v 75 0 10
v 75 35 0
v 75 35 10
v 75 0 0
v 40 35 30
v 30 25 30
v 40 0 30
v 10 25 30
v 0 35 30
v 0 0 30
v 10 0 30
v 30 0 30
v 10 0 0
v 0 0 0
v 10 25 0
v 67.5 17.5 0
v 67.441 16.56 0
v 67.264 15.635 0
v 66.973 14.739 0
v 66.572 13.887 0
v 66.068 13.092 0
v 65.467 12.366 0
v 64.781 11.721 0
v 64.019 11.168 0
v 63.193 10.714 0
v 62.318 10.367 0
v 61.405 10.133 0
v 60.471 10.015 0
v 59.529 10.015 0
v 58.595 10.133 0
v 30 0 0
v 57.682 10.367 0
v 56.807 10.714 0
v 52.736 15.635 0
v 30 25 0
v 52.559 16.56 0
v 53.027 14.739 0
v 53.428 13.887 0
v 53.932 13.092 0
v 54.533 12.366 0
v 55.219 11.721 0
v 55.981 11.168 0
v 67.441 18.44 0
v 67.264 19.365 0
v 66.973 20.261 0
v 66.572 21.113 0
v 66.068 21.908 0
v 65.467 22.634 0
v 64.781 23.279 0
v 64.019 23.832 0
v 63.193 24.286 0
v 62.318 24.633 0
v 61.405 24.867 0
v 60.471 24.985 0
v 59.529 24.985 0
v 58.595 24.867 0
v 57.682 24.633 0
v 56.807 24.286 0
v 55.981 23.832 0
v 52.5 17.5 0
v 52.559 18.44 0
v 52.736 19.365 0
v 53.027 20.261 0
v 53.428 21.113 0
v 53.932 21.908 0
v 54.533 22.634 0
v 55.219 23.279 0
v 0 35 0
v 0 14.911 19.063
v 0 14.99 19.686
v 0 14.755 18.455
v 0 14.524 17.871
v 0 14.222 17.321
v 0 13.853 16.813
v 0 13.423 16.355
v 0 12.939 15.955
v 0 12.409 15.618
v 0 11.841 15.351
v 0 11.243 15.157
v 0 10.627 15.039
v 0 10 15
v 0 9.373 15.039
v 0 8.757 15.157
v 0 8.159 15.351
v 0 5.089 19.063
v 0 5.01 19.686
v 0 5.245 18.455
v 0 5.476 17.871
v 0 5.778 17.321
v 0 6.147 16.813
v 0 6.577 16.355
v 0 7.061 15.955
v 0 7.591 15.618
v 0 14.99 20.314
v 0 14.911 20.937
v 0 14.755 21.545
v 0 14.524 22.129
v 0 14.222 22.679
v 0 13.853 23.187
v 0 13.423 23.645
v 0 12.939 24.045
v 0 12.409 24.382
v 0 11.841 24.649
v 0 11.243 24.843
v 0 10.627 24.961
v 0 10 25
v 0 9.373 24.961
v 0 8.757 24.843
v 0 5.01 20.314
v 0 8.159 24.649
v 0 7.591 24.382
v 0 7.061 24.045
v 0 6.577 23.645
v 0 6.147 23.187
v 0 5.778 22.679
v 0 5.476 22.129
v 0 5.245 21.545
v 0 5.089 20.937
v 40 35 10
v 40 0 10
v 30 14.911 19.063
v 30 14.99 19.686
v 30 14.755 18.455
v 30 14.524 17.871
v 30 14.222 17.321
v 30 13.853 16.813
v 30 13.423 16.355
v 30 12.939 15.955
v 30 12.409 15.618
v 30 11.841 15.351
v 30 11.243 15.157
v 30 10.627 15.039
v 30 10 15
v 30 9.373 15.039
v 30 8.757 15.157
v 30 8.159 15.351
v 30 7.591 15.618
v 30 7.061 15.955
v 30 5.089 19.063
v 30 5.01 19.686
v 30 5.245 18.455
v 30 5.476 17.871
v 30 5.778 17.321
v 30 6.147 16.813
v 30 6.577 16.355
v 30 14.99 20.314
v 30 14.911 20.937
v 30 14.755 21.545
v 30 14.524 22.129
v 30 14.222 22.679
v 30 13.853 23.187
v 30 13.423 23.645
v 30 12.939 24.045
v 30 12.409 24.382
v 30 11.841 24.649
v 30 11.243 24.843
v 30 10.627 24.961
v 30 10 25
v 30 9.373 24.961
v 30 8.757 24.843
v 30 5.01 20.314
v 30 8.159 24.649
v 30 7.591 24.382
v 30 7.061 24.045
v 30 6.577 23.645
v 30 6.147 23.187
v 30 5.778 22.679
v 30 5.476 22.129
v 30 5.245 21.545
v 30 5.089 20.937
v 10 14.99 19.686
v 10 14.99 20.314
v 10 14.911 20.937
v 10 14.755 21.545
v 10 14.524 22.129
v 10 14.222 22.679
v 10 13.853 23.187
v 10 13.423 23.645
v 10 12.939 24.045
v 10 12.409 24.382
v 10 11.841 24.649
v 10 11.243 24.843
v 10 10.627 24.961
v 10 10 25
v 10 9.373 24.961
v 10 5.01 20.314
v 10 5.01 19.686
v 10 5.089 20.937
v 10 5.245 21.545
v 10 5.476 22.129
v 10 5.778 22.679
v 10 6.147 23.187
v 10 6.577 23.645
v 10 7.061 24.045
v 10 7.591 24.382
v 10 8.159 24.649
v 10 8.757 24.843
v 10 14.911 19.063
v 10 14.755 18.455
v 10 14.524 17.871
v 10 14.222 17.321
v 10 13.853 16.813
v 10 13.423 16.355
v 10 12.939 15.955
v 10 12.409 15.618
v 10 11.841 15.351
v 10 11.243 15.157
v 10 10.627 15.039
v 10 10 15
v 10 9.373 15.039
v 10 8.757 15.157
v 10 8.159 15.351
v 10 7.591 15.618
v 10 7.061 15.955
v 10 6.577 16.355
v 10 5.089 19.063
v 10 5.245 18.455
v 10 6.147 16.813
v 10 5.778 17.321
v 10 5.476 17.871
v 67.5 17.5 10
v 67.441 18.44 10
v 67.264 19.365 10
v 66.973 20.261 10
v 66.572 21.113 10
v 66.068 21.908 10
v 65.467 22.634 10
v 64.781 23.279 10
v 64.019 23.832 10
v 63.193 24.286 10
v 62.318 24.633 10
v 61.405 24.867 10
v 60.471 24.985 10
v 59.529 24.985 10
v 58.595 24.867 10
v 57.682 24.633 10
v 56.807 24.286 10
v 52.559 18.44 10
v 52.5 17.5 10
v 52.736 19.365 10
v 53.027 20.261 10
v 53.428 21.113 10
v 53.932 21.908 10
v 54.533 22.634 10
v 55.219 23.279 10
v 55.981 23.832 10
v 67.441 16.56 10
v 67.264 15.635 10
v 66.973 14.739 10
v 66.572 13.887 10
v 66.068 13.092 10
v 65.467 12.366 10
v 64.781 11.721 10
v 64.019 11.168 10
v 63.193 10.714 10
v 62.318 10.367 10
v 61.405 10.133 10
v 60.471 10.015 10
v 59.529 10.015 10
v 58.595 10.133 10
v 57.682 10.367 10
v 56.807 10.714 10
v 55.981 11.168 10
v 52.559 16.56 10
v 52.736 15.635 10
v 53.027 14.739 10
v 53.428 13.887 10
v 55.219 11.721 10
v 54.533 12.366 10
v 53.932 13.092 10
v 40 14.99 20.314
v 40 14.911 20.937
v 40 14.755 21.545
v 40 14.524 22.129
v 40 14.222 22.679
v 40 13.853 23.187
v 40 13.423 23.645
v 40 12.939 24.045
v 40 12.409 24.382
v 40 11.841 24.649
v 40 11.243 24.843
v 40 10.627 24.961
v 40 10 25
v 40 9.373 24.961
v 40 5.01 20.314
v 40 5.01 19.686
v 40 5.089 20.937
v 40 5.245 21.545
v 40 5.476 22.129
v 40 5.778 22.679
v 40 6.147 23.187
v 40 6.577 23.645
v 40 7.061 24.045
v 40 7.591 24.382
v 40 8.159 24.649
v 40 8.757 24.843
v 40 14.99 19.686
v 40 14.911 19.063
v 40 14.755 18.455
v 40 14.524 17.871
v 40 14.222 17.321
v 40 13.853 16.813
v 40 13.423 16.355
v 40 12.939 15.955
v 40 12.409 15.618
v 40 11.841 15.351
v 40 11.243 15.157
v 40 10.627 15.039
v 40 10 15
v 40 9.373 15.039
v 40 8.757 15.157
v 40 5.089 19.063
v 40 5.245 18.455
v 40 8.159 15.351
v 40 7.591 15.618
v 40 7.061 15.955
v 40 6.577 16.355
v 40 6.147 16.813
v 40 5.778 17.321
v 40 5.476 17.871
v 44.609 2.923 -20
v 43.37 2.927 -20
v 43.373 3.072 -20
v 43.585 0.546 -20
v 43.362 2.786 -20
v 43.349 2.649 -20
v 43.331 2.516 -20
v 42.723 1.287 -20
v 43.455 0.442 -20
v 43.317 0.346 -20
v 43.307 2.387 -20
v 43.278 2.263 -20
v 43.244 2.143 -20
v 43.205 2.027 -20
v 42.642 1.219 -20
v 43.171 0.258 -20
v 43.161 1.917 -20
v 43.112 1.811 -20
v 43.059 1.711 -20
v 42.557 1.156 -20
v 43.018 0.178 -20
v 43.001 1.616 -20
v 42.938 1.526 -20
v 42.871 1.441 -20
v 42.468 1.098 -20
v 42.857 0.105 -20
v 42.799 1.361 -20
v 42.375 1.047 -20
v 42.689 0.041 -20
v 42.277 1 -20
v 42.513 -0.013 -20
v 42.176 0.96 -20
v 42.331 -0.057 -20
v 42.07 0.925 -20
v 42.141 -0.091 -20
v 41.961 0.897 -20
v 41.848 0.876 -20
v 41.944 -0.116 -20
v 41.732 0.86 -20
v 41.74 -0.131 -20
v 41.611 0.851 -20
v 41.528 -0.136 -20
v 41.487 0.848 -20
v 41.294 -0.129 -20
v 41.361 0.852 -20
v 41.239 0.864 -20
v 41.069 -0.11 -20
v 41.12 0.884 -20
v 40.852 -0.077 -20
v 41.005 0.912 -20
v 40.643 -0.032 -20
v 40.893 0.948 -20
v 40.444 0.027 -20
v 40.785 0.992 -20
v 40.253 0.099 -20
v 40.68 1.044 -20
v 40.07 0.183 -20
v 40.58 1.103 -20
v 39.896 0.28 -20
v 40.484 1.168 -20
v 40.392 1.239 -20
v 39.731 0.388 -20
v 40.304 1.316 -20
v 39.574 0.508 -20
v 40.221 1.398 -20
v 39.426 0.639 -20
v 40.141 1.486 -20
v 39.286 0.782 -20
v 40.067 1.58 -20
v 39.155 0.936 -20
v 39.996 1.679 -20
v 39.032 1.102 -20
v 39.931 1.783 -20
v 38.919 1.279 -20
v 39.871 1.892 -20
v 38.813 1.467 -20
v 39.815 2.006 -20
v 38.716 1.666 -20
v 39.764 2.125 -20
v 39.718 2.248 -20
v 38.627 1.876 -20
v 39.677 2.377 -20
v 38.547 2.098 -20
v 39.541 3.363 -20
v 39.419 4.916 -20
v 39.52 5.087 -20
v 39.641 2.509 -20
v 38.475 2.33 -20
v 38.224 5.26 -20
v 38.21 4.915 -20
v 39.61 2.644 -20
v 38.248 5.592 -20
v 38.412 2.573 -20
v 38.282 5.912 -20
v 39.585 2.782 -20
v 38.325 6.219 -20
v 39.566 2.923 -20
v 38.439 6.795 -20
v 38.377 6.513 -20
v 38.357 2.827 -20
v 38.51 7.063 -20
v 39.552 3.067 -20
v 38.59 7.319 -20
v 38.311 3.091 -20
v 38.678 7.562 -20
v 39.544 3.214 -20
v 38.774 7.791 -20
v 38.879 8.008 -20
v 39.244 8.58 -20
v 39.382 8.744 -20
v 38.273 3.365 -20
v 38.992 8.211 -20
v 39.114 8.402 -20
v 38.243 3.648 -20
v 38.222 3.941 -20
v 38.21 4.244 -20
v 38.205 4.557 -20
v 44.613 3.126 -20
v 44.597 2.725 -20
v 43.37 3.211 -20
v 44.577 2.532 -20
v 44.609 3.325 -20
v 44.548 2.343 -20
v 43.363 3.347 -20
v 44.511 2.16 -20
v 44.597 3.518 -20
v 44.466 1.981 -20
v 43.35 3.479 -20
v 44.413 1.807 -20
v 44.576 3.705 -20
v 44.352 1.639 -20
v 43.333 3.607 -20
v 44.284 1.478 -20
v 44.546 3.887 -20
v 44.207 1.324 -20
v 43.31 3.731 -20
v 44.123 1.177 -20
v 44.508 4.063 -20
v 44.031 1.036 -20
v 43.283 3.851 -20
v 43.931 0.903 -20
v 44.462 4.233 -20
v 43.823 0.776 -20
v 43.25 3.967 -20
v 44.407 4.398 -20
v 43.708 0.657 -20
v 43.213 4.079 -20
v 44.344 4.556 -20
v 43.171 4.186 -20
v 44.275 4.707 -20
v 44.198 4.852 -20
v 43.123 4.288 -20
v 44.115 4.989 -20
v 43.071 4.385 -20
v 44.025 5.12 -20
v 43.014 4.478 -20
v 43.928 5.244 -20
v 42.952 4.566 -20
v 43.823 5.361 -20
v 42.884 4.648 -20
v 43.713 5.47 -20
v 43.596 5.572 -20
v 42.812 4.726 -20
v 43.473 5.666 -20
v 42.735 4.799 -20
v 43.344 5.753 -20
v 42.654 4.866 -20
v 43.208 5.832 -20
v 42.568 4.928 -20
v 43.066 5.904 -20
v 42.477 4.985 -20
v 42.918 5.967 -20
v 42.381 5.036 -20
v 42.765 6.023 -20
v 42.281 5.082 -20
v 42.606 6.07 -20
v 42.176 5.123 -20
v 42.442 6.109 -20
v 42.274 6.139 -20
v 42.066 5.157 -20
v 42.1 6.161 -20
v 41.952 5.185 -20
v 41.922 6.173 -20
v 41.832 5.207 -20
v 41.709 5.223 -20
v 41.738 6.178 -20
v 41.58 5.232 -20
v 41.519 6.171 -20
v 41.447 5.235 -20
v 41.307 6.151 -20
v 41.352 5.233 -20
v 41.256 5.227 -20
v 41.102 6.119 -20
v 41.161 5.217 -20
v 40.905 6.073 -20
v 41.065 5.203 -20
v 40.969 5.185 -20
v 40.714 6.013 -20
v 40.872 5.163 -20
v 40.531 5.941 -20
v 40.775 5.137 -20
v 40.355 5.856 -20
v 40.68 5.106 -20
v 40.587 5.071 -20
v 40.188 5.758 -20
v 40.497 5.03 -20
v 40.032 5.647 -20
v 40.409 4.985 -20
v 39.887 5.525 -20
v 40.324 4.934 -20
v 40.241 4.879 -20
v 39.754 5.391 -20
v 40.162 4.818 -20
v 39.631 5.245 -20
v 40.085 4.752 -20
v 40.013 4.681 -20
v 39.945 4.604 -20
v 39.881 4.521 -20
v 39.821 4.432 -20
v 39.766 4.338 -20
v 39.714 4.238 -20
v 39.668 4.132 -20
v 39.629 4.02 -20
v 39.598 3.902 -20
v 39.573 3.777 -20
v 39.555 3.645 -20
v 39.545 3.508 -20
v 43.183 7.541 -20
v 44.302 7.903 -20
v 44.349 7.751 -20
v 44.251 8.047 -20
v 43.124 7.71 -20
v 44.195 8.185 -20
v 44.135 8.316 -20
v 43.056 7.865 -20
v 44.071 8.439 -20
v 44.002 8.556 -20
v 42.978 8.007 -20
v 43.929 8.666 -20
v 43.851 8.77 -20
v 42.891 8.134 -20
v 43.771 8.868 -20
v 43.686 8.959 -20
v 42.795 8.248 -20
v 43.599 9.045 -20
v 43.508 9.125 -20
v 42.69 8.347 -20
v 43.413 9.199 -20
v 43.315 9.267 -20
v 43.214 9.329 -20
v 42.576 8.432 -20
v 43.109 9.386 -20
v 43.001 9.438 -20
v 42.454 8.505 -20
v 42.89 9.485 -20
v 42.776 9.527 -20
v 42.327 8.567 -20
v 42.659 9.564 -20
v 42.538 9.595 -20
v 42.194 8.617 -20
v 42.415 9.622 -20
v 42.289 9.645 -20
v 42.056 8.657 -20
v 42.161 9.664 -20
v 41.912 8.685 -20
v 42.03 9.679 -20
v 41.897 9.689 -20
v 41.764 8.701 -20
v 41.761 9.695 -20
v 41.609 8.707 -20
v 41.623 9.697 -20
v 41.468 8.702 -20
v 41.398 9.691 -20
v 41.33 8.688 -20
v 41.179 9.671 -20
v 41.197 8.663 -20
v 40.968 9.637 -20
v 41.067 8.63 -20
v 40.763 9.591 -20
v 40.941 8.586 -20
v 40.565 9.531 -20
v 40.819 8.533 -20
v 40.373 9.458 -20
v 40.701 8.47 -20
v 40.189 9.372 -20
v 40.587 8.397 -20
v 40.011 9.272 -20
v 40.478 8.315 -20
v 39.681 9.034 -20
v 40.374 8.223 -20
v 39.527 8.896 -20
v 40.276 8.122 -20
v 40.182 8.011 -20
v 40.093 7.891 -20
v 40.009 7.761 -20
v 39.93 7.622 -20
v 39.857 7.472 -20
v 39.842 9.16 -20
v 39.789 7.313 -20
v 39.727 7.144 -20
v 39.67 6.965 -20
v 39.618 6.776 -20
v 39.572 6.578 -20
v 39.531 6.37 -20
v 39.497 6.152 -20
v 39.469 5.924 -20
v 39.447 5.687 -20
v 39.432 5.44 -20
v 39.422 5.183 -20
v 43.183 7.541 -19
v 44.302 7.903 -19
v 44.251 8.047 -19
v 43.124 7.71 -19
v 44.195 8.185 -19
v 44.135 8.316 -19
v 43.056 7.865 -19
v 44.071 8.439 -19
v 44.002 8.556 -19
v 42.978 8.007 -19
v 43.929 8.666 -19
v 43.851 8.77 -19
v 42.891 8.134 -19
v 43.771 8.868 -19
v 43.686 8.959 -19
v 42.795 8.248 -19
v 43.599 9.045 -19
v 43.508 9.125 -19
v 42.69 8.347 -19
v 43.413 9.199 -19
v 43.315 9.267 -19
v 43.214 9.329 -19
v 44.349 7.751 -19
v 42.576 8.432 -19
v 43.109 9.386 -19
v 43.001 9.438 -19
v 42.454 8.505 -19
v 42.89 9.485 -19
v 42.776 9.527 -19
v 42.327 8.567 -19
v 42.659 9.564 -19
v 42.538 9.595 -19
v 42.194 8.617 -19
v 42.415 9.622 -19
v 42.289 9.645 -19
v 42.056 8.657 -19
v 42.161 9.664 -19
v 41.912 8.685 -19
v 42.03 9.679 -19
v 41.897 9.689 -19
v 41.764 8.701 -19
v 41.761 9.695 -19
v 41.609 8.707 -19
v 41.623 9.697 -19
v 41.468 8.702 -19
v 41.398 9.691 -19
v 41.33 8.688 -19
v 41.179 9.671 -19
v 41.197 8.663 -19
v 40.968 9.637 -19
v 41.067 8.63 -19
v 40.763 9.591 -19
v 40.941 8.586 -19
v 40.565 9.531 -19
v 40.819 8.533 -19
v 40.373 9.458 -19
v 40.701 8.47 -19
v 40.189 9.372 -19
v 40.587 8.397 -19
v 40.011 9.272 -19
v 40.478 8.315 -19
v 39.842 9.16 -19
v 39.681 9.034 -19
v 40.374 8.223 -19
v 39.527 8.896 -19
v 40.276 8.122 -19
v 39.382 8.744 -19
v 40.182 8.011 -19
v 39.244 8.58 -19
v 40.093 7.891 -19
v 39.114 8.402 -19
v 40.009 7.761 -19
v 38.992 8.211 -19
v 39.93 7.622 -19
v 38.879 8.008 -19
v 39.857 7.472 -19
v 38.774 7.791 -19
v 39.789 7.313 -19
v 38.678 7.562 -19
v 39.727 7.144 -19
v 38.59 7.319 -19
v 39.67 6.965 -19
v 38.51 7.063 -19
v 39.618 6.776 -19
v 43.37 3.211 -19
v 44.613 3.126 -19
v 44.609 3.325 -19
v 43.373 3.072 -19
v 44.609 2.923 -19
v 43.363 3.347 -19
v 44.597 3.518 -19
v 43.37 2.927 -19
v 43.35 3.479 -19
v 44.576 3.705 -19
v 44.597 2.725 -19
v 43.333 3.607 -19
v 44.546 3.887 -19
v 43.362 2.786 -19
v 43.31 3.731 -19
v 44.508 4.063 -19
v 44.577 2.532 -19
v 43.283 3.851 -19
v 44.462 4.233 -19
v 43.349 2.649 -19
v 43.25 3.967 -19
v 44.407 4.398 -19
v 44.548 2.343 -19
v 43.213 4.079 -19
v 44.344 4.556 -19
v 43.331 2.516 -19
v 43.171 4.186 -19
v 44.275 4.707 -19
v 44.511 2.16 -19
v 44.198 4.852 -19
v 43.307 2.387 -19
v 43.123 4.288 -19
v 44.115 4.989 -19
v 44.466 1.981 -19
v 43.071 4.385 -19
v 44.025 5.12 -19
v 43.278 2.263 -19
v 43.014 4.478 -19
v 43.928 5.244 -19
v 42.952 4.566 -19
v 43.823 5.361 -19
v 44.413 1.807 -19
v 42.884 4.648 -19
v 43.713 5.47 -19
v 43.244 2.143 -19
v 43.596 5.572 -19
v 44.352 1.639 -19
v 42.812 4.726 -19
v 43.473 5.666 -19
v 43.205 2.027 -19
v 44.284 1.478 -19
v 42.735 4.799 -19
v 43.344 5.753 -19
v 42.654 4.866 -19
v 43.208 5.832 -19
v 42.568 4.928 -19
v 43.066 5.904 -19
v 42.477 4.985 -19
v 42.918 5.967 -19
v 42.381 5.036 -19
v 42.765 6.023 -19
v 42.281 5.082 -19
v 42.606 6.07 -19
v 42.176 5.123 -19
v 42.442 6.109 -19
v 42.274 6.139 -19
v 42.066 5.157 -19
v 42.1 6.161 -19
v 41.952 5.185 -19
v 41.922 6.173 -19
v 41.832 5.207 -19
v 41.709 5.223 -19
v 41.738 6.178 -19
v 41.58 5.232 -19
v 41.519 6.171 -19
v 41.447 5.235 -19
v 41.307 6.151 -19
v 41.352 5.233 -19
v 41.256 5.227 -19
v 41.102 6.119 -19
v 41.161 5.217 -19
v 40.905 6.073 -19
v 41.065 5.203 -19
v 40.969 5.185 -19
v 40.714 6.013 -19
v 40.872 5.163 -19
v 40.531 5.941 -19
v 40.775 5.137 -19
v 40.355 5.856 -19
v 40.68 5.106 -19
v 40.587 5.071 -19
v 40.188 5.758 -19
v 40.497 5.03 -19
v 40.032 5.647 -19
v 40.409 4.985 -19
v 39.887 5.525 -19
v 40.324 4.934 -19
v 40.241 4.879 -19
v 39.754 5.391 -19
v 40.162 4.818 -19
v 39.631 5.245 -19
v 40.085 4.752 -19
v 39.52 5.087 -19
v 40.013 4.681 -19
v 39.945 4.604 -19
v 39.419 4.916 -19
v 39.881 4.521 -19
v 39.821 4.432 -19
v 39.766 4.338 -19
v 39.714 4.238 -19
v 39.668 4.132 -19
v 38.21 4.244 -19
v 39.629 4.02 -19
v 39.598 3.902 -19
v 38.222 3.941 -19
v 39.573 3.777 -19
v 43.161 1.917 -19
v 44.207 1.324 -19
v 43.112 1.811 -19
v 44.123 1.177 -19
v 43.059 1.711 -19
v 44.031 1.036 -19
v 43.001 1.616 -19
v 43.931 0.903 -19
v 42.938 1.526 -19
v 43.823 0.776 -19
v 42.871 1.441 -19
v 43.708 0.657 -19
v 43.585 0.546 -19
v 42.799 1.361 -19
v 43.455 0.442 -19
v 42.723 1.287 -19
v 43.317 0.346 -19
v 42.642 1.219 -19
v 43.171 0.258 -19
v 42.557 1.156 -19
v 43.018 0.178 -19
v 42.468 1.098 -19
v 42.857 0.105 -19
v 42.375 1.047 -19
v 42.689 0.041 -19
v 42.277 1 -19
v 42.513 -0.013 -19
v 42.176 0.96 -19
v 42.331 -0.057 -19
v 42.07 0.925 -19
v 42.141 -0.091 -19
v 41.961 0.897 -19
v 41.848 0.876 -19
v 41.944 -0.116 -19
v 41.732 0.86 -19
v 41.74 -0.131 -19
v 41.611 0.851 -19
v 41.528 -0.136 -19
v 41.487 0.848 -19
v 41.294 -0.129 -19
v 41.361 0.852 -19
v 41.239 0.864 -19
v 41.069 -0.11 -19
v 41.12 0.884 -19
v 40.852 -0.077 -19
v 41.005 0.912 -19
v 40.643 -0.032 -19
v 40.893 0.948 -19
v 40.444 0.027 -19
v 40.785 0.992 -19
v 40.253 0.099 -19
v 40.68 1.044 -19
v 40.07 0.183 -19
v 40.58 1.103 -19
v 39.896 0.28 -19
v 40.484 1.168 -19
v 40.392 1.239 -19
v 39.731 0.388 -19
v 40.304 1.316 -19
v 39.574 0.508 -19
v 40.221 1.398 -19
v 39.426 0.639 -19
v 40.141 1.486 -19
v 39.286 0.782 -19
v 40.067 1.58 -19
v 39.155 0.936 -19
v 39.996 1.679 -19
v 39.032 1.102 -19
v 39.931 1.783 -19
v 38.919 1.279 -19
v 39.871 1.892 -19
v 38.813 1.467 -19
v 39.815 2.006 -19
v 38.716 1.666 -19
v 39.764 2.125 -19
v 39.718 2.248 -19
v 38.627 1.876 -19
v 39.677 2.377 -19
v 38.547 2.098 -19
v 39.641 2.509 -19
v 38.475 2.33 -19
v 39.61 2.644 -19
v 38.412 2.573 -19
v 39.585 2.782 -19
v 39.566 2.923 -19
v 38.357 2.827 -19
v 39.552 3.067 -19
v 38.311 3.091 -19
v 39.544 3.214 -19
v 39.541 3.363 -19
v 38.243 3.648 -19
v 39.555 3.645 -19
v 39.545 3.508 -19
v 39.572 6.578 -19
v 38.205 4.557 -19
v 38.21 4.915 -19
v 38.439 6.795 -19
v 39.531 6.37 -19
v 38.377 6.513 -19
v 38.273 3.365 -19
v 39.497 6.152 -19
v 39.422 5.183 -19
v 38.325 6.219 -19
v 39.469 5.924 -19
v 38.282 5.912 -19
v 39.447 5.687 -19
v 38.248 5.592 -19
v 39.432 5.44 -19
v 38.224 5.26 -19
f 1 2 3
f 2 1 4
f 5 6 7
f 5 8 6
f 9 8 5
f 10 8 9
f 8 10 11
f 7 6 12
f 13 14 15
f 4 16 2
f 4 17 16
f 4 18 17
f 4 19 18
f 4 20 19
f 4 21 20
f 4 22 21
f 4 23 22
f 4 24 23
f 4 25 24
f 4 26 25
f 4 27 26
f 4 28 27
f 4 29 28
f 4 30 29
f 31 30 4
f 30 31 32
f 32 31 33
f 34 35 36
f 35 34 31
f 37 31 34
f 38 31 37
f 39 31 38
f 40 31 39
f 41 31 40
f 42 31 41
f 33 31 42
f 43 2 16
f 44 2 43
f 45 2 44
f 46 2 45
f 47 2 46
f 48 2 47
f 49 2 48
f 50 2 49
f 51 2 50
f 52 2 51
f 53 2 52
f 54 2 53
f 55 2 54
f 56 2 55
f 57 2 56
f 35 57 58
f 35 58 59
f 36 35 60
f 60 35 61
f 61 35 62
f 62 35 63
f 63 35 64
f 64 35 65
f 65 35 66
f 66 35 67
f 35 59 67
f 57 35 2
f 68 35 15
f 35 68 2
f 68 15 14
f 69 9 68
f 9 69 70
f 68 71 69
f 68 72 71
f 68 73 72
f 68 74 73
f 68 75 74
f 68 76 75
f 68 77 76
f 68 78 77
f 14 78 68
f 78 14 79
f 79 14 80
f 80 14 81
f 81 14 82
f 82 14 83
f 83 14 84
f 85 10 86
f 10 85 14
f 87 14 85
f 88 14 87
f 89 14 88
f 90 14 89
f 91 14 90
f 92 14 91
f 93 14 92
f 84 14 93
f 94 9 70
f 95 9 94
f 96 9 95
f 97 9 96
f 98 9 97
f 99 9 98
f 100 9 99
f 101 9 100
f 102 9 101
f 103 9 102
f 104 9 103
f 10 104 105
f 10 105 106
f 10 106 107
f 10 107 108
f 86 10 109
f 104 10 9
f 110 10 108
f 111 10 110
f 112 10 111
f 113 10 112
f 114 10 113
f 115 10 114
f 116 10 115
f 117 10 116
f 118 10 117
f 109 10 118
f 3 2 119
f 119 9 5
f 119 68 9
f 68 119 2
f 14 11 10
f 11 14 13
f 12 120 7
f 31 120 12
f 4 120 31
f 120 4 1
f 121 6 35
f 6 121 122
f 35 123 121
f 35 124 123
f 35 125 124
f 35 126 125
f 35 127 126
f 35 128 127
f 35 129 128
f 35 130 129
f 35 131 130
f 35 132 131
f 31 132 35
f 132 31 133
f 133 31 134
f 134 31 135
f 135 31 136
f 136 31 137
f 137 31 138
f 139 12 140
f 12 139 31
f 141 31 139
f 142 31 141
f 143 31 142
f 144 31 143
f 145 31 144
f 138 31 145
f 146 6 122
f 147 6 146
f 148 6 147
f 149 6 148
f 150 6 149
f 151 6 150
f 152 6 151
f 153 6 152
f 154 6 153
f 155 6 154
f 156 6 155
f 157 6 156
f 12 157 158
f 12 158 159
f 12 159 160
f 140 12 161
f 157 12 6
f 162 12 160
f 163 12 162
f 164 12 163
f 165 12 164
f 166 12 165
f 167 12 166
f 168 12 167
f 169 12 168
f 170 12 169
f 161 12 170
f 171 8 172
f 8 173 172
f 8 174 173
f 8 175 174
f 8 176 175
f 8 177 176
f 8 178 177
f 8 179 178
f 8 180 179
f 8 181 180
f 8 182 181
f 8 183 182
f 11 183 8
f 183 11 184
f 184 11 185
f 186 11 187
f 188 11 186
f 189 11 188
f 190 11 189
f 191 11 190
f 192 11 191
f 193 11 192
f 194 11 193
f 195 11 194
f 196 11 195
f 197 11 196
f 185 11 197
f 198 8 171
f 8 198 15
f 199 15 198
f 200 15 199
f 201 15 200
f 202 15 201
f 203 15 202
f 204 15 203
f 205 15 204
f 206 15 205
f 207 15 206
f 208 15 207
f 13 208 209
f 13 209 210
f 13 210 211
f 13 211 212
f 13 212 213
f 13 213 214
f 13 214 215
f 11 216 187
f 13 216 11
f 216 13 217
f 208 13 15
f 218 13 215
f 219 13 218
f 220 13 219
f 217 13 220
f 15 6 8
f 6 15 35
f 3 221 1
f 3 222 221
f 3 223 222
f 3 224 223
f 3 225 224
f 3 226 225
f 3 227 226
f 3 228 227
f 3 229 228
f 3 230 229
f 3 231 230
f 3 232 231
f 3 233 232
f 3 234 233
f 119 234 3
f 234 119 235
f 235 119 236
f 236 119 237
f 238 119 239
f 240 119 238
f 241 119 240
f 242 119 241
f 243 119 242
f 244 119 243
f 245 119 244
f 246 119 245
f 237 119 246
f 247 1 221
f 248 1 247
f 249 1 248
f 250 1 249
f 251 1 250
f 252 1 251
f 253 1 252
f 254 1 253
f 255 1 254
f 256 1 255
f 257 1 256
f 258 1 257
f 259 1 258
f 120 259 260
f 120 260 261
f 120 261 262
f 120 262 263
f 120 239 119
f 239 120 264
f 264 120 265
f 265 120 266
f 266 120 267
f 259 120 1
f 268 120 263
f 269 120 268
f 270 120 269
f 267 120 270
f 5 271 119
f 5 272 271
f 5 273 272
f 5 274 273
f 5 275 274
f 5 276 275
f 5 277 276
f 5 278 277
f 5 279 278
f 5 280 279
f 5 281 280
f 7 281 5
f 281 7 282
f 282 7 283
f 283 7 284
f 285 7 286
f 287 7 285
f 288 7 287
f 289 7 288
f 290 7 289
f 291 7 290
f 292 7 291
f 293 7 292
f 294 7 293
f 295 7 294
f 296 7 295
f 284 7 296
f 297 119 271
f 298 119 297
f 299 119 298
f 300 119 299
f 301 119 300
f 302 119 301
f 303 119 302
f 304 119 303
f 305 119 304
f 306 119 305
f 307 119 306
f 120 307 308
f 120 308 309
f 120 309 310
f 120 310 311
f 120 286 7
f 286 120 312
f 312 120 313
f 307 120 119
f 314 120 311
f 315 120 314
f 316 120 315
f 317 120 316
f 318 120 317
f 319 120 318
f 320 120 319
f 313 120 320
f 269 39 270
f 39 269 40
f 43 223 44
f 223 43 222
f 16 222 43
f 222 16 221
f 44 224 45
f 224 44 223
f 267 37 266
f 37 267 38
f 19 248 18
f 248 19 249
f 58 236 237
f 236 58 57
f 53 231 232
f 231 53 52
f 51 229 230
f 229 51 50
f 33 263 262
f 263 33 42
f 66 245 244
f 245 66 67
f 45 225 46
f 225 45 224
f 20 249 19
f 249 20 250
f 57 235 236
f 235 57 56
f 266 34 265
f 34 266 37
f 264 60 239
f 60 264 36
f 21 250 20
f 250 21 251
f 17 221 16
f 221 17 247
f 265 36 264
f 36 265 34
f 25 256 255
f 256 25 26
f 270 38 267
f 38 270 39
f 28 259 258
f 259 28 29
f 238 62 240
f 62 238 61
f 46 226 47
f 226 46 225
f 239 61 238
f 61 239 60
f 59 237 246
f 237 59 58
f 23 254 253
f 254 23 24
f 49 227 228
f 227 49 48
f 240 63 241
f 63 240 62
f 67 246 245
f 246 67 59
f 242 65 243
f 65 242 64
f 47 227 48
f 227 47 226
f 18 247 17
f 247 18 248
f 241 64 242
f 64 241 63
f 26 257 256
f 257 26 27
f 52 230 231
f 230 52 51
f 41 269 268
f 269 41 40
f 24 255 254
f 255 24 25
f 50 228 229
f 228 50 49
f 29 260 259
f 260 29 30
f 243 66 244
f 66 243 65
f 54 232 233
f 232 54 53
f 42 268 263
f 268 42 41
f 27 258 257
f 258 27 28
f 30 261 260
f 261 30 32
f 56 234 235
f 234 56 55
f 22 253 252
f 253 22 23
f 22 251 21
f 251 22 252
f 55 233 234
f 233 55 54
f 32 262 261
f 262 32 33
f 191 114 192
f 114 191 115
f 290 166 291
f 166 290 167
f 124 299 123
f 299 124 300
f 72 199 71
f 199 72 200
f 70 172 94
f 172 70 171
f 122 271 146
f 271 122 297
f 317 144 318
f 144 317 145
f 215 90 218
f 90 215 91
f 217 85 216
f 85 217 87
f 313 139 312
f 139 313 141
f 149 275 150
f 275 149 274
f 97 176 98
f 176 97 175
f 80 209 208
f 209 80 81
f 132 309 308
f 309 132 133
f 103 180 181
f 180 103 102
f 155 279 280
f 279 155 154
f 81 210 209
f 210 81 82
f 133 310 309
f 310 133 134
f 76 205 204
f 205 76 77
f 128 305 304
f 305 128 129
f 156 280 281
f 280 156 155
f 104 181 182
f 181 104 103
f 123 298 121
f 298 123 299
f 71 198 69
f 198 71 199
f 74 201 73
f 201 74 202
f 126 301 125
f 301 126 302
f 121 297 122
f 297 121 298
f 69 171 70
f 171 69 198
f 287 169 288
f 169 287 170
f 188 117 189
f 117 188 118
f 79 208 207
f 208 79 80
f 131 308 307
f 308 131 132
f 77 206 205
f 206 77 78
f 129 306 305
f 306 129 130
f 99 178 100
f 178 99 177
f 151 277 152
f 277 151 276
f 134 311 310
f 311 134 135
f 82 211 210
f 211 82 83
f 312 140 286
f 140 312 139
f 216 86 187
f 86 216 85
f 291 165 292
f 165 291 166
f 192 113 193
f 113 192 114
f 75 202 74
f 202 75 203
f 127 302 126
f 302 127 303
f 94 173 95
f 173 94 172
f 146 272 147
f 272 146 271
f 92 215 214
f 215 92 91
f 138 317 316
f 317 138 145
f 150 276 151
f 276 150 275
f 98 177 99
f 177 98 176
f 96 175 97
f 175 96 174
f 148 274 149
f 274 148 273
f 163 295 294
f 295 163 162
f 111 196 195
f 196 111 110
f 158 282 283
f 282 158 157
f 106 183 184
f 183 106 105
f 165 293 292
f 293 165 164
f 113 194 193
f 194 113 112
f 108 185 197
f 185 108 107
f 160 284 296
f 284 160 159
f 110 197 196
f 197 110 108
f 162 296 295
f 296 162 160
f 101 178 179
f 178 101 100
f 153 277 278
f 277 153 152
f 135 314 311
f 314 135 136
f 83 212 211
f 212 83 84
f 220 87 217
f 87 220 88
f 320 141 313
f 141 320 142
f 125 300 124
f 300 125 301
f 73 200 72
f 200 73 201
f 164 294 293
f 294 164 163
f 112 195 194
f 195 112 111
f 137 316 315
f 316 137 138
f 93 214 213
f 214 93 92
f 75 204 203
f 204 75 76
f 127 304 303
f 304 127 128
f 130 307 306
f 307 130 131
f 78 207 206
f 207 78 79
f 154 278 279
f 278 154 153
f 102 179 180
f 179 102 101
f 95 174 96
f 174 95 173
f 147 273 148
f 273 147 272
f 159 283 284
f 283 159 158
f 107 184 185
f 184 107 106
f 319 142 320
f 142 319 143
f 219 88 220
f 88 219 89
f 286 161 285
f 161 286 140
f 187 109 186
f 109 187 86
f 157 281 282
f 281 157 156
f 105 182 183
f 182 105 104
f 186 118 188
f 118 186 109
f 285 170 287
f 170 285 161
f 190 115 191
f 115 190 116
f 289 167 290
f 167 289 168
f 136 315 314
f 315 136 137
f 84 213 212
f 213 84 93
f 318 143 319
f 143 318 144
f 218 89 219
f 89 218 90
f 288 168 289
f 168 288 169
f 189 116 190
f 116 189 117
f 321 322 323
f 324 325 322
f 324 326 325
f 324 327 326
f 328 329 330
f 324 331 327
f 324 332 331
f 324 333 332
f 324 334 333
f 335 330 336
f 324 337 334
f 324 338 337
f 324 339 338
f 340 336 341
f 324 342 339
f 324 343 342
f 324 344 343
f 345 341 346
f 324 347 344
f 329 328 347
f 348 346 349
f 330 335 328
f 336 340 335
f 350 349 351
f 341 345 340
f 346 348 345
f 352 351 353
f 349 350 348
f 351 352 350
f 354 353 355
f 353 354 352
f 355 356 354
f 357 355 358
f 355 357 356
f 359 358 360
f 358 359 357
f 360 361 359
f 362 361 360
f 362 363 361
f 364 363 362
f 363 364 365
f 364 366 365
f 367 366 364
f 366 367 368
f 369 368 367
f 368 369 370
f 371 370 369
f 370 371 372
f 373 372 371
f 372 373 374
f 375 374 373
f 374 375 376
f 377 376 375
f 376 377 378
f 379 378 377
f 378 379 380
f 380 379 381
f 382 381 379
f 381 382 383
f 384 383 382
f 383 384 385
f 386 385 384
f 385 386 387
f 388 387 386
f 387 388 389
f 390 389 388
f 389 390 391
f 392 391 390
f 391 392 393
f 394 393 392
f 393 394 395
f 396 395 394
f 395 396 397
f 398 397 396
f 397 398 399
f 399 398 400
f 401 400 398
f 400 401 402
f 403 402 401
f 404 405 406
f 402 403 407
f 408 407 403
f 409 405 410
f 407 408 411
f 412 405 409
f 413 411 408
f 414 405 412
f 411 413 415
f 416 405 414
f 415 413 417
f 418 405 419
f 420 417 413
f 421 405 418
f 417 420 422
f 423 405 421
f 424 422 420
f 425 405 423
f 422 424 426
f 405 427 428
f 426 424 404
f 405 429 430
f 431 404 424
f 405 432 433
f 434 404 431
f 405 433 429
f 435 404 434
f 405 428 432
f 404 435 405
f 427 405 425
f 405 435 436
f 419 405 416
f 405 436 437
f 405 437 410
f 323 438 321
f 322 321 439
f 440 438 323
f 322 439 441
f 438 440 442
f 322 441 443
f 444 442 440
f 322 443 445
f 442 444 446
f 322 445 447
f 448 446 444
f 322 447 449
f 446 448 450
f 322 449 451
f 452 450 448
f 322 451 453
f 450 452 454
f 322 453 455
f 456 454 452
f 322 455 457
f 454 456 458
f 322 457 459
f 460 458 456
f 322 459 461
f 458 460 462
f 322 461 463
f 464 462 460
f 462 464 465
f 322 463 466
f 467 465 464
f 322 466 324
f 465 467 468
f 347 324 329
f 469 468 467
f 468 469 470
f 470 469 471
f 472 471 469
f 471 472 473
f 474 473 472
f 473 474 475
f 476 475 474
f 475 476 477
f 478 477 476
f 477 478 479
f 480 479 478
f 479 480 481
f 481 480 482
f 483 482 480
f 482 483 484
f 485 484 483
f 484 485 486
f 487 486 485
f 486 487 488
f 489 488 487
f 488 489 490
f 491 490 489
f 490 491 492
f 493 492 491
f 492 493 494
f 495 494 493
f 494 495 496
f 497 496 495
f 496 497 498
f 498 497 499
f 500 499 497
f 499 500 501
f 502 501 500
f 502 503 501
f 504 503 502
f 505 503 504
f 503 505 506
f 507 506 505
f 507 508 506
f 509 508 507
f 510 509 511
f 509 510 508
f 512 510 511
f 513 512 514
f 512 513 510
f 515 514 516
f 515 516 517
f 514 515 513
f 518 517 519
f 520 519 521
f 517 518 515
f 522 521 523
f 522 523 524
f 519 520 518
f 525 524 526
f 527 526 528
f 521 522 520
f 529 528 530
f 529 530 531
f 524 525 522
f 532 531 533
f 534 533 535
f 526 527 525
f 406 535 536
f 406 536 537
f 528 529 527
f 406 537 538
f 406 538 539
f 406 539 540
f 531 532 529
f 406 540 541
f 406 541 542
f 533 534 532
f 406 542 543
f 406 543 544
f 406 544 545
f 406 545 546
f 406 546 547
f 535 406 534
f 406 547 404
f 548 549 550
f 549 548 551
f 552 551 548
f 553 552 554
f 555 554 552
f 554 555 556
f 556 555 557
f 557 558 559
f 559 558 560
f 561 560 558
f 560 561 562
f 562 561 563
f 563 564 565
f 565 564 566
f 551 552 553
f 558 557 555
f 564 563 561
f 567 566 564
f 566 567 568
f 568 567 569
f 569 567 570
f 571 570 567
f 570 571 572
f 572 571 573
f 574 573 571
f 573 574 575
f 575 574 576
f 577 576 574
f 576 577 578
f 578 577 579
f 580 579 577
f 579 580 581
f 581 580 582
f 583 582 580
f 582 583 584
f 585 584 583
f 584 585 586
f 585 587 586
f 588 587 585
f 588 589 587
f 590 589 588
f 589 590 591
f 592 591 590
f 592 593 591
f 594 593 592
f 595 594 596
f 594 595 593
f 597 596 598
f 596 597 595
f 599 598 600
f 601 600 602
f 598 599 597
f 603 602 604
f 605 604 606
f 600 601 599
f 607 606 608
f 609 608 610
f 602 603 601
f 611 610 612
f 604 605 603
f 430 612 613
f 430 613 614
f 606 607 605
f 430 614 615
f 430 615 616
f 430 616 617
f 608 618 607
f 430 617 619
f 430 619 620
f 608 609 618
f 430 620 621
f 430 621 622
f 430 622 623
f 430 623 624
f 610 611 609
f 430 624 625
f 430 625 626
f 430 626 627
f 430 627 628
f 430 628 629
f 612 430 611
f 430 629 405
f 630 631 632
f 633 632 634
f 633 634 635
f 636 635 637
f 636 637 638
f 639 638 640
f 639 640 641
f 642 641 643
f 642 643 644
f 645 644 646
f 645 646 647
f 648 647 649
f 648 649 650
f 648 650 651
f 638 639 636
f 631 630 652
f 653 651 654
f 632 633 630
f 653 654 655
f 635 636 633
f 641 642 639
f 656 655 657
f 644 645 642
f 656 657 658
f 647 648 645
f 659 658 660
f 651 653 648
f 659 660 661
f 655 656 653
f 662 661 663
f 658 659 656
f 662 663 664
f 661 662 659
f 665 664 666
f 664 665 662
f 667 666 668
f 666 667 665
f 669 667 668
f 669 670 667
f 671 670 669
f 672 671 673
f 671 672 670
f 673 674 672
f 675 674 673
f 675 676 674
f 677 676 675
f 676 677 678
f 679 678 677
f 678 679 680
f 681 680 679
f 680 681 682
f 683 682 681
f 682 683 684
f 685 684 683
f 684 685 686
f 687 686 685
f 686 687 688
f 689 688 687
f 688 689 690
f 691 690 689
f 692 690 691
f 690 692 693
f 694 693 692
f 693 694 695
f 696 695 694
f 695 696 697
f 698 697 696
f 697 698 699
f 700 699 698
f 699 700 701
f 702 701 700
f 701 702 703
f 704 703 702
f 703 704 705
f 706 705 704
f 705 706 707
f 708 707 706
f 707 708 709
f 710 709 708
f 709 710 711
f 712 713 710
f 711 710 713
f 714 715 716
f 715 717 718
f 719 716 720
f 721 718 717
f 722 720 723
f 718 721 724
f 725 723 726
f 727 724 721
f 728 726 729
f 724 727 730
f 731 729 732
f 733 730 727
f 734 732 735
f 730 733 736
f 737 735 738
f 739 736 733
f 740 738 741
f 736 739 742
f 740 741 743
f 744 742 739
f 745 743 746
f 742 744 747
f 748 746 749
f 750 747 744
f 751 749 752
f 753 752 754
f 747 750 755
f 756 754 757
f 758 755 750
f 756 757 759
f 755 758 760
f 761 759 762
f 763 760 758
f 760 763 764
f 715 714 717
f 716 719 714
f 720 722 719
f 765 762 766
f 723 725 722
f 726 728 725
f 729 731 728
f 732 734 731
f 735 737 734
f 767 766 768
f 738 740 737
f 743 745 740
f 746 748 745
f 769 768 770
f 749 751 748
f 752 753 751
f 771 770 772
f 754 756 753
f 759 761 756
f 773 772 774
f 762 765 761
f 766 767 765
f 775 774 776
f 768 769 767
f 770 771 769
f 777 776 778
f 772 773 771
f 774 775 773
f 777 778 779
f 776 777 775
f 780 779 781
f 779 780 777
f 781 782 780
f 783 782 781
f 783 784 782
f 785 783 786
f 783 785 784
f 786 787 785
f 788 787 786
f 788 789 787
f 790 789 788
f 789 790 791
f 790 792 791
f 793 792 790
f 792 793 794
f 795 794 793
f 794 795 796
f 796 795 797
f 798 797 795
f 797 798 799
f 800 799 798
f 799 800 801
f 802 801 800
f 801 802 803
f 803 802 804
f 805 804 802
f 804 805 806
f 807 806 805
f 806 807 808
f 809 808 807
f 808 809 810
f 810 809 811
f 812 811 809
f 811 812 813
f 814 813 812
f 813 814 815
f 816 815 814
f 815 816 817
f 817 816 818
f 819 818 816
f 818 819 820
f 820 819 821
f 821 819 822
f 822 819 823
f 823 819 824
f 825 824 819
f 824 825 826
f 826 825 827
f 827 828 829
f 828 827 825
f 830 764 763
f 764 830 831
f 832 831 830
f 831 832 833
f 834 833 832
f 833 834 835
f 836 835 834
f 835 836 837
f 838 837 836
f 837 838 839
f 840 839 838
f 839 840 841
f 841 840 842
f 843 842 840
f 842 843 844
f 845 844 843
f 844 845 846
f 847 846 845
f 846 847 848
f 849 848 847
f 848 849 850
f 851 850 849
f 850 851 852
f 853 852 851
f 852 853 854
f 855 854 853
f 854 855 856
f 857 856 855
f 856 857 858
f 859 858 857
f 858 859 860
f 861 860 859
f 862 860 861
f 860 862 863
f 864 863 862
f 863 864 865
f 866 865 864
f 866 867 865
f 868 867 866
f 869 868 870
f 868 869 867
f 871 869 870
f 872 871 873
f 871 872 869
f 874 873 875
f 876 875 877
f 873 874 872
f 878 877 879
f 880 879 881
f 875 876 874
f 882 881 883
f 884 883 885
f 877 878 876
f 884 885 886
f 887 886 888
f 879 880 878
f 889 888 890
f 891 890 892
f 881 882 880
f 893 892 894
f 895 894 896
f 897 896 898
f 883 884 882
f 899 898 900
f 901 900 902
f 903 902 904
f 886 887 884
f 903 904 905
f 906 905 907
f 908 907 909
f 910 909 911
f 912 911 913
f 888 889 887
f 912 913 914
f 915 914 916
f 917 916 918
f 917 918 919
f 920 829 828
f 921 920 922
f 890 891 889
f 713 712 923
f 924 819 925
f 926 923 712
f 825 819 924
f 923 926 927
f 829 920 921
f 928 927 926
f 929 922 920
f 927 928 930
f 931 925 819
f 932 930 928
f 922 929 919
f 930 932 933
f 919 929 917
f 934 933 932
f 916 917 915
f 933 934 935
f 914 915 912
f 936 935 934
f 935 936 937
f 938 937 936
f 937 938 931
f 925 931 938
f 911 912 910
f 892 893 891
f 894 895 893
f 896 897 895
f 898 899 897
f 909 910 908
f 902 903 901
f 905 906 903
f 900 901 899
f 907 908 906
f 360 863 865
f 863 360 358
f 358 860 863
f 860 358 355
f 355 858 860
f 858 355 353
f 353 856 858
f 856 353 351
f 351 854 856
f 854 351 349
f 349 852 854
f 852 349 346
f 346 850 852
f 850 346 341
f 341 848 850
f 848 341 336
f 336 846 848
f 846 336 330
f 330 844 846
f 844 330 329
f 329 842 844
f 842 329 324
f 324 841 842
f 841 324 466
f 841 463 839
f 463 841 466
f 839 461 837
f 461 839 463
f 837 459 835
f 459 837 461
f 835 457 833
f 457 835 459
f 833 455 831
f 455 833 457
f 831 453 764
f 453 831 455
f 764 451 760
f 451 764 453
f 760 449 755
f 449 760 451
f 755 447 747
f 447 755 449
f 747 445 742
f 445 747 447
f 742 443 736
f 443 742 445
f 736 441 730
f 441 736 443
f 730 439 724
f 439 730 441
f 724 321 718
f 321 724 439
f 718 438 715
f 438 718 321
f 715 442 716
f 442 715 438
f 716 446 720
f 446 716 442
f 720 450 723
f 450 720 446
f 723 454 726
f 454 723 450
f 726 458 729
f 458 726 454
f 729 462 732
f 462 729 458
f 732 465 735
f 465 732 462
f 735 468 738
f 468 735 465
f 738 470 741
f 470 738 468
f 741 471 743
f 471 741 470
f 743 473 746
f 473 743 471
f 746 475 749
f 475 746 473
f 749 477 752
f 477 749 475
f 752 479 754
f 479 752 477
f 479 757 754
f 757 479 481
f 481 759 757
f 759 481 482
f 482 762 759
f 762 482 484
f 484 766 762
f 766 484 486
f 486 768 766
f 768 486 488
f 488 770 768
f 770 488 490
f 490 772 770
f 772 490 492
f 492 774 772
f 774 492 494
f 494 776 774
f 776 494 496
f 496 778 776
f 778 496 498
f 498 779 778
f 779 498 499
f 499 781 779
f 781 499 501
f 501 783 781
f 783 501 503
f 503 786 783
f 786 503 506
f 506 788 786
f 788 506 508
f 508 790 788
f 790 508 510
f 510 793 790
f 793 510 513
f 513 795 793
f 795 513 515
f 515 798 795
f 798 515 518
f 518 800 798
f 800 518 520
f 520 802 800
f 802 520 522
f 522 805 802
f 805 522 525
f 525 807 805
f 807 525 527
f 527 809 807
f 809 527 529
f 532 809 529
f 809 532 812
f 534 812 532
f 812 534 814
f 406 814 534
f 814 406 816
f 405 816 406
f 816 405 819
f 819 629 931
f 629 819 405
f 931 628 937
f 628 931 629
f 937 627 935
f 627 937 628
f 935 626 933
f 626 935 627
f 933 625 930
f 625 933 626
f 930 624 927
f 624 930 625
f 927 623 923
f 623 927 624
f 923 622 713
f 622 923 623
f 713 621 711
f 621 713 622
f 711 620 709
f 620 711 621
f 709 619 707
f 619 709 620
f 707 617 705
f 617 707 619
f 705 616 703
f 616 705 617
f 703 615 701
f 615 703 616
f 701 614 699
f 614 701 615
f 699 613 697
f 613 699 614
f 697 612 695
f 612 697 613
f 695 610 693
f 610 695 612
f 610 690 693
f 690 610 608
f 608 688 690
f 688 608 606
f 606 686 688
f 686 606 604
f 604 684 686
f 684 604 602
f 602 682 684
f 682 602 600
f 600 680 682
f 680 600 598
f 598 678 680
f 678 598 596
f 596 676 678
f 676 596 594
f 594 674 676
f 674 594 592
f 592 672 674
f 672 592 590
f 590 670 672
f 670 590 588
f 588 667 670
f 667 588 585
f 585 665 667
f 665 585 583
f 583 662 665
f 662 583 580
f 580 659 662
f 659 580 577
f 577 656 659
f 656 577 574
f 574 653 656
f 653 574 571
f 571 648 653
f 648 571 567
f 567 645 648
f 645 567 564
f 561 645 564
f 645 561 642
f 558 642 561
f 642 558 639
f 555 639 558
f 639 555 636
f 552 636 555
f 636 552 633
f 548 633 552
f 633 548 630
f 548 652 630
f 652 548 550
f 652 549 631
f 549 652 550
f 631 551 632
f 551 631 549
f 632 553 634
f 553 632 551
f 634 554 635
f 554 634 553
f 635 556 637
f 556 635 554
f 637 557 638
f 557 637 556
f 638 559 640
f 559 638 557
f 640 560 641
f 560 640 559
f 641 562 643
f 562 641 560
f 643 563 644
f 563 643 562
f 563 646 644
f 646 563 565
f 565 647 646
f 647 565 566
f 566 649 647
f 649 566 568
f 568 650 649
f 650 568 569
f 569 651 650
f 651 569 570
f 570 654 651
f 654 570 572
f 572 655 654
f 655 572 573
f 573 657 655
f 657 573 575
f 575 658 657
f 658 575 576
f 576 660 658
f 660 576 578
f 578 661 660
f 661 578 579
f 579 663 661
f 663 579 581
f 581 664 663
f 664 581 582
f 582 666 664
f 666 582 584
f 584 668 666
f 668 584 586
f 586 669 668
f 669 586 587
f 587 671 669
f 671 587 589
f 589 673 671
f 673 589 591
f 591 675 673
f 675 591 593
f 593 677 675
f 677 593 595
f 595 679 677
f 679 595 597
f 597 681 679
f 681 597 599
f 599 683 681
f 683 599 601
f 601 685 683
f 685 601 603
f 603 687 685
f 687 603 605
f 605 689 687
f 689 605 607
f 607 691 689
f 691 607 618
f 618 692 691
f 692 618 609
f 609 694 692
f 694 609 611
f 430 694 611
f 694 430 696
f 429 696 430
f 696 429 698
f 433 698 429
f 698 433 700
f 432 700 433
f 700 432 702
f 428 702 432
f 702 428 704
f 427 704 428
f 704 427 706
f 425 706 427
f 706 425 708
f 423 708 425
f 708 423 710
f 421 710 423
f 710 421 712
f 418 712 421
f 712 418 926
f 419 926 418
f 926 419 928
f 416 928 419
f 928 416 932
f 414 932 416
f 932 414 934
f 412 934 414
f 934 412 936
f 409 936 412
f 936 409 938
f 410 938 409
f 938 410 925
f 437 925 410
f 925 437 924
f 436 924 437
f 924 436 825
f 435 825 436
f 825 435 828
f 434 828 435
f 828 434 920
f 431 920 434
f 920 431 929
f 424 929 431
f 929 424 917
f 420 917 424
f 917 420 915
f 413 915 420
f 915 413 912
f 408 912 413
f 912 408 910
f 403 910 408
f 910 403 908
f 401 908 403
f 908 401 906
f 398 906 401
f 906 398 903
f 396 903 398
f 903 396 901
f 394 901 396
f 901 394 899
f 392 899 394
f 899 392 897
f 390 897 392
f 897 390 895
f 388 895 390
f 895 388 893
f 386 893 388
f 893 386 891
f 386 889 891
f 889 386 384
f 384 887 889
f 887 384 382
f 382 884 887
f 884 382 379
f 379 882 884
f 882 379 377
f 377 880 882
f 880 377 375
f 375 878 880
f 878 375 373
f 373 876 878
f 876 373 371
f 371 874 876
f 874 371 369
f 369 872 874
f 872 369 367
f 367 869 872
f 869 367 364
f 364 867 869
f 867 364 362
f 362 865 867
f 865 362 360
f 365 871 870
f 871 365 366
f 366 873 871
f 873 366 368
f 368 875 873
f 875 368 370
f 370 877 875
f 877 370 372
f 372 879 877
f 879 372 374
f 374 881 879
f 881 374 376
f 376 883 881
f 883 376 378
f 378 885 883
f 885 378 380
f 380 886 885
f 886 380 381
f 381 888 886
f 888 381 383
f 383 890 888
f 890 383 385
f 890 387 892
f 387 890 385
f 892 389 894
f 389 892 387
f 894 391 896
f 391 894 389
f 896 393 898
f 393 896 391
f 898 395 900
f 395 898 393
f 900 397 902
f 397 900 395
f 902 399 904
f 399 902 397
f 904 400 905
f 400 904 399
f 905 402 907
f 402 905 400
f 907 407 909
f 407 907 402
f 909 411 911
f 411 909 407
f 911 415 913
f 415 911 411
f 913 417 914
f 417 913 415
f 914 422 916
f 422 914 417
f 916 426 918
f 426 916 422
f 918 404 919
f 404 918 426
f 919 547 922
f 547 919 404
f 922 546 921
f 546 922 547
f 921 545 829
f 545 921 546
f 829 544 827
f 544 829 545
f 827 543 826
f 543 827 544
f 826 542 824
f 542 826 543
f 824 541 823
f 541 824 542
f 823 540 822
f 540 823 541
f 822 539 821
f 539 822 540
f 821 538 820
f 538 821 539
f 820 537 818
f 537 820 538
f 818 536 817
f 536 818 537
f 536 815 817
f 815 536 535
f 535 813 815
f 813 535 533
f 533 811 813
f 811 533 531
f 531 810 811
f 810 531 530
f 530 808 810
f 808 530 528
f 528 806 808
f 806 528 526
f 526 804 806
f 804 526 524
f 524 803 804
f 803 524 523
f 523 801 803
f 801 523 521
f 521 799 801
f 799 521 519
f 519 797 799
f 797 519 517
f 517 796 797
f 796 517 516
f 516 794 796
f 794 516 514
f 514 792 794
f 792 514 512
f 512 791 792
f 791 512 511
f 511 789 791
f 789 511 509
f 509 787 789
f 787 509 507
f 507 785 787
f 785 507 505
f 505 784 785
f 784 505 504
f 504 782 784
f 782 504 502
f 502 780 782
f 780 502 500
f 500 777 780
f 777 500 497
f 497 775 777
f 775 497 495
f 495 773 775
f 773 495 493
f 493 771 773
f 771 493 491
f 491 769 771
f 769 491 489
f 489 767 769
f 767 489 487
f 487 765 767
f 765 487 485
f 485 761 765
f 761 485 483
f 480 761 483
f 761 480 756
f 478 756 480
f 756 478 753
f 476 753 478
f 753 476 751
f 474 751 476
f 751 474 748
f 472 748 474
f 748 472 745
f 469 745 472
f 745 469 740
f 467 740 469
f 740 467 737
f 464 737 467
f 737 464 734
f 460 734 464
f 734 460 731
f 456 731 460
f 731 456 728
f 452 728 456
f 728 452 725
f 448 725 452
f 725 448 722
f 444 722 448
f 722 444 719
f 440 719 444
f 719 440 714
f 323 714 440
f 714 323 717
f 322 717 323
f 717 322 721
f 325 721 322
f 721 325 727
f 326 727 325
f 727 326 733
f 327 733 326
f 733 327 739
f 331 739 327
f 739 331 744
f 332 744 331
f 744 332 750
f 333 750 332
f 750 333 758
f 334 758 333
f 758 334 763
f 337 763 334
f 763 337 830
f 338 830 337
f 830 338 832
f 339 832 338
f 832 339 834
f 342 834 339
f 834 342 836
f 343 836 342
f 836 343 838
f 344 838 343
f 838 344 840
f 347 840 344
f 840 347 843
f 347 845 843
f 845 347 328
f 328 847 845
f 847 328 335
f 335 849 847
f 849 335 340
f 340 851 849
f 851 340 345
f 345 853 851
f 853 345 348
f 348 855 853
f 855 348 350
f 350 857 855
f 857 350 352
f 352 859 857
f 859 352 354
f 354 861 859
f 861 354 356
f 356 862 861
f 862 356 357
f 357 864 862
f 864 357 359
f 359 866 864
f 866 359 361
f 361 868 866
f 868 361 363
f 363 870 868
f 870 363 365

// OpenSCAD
$fn=50;

cw=75;
cd=35;
ch=30;

difference() {
    cube([cw,cd,ch]);
    translate([10,0,0])
    cube([20,cd-10,ch]);
    translate([40,0,10])
    cube([cw-20*2,cd,ch-10]);
    translate([cw-15,cd/2,0])
    cylinder(h=10,d=15);
    translate([0,10,20])
    rotate([0,90,0])
    cylinder(h=40,d=10);
}
translate([cw/2,0,-20])
linear_extrude(height=1)
text("6");
